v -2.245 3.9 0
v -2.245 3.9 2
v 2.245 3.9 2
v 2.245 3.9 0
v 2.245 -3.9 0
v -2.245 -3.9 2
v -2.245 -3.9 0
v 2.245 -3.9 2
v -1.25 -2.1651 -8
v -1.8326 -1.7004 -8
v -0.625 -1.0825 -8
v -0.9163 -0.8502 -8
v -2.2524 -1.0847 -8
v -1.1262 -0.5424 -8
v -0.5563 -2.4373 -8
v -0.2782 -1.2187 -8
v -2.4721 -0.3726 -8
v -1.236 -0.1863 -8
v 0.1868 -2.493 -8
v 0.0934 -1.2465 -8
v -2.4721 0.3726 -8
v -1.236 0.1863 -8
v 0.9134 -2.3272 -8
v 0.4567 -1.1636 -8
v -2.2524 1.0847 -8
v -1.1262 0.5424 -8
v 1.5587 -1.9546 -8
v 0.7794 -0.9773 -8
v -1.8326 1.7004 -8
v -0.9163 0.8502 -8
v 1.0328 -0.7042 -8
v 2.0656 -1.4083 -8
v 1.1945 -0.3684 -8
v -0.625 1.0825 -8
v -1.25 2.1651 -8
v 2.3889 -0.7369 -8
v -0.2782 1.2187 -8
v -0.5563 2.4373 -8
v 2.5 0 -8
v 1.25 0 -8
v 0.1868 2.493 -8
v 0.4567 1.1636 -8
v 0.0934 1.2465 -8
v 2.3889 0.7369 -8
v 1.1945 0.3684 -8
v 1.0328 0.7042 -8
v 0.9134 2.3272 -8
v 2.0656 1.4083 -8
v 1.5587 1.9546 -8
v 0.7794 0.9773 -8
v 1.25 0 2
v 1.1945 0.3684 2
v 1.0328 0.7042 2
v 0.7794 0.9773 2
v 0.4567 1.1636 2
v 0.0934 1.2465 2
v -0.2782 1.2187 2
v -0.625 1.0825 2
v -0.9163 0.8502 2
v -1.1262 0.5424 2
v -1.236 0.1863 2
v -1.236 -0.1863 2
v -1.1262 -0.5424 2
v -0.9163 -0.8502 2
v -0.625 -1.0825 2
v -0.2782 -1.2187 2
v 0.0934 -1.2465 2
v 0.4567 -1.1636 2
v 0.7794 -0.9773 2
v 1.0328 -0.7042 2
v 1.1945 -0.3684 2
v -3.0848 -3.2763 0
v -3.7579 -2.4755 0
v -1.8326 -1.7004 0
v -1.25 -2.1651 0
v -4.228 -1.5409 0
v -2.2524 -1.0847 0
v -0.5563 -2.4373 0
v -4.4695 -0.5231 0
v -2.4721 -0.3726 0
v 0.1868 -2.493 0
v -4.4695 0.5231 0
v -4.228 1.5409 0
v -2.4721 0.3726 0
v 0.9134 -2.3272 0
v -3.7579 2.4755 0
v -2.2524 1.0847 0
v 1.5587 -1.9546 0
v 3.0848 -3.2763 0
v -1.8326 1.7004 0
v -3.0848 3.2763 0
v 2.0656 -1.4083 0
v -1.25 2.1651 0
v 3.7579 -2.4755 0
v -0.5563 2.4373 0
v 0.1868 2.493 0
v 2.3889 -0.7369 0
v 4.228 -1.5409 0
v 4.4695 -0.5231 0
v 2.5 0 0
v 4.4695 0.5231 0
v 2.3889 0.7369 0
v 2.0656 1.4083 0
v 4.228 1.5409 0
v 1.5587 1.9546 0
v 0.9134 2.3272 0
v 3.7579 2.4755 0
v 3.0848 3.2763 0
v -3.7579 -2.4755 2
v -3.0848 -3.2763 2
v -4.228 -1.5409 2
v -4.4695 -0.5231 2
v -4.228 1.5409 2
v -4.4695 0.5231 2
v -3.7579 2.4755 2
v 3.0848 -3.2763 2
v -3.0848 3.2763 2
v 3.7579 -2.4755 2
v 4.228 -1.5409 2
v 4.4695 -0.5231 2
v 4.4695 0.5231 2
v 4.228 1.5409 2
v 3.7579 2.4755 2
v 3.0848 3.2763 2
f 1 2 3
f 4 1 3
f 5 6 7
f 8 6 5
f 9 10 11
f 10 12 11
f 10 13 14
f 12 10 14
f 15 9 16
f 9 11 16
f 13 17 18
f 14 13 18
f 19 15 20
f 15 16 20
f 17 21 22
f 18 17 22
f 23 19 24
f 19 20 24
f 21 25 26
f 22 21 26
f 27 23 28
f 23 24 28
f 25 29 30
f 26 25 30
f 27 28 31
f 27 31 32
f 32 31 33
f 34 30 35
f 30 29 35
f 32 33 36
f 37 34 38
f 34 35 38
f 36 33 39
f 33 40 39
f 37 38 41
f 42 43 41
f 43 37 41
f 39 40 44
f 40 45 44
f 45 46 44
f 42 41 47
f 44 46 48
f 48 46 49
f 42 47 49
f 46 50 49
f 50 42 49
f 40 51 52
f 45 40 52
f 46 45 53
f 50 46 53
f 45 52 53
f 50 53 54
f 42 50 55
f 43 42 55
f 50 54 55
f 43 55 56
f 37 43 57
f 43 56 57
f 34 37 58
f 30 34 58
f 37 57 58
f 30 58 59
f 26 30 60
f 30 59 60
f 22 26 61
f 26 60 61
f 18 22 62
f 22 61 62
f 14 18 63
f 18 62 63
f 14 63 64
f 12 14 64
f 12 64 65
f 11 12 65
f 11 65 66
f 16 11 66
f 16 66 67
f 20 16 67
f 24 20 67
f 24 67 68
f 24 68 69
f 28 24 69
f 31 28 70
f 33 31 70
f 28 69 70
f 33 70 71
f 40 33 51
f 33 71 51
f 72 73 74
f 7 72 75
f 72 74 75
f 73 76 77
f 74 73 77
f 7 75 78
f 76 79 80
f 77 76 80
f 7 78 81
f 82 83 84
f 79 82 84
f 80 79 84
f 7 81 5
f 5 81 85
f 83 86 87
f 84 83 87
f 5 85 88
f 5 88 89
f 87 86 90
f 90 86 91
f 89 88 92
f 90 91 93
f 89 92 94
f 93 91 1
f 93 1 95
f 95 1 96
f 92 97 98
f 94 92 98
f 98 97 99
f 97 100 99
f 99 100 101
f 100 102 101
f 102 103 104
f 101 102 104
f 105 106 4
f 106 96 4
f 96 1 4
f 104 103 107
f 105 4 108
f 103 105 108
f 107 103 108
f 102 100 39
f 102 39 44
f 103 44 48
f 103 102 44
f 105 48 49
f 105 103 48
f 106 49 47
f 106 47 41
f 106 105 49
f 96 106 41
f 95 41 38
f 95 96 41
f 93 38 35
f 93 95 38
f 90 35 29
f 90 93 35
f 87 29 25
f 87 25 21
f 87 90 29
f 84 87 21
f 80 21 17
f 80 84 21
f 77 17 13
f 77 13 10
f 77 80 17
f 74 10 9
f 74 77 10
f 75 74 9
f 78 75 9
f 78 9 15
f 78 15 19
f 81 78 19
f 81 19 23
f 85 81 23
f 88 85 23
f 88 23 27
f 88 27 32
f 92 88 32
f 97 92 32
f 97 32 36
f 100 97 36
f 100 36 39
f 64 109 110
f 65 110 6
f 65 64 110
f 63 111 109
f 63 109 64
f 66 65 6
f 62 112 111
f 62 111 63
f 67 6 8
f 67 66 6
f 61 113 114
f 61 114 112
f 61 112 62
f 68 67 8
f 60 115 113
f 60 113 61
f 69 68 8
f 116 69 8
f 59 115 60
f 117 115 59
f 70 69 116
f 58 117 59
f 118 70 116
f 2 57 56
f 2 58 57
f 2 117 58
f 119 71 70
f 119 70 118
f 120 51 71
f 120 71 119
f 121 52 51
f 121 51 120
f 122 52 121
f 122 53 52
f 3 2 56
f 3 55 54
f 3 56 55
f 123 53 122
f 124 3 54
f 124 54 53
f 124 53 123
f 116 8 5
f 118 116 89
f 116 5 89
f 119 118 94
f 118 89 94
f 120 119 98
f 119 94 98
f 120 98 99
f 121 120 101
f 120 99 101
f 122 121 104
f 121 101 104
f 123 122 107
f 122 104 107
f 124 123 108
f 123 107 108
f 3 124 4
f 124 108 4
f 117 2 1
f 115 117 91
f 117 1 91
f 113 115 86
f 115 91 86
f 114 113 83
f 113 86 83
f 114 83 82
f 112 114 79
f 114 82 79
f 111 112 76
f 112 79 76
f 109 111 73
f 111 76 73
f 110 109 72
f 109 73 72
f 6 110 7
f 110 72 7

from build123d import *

# Parameters (mm, degrees)
SKETCH1_R           = 4.5
SKETCH1_R_2         = 2.3
BOSS_EXTRUDE1_DEPTH = 2
SKETCH2_R           = 2.5
SKETCH2_R_2         = 1.25
BOSS_EXTRUDE2_DEPTH = 10
SKETCH3_R           = 9.569639601
SKETCH3_W           = 11
SKETCH3_H           = 7.8
CUT_EXTRUDE1_DEPTH  = 10


with BuildPart() as part:
    # Sketch1 → Boss-Extrude1 (new body)
    with BuildSketch(Plane.XY):
        Circle(SKETCH1_R)
        Circle(SKETCH1_R_2, mode=Mode.SUBTRACT)
    extrude(amount=BOSS_EXTRUDE1_DEPTH)

    # Sketch2 → Boss-Extrude2 (add)
    with BuildSketch(Plane.XY.offset(2)):
        Circle(SKETCH2_R)
        Circle(SKETCH2_R_2, mode=Mode.SUBTRACT)
    extrude(amount=-BOSS_EXTRUDE2_DEPTH)

    # Sketch3 → Cut-Extrude1 (cut)
    with BuildSketch(Plane.XY.offset(2)):
        Circle(SKETCH3_R)
        Rectangle(SKETCH3_W, SKETCH3_H, mode=Mode.SUBTRACT)
    extrude(amount=-CUT_EXTRUDE1_DEPTH, mode=Mode.SUBTRACT)


solid = part.part
